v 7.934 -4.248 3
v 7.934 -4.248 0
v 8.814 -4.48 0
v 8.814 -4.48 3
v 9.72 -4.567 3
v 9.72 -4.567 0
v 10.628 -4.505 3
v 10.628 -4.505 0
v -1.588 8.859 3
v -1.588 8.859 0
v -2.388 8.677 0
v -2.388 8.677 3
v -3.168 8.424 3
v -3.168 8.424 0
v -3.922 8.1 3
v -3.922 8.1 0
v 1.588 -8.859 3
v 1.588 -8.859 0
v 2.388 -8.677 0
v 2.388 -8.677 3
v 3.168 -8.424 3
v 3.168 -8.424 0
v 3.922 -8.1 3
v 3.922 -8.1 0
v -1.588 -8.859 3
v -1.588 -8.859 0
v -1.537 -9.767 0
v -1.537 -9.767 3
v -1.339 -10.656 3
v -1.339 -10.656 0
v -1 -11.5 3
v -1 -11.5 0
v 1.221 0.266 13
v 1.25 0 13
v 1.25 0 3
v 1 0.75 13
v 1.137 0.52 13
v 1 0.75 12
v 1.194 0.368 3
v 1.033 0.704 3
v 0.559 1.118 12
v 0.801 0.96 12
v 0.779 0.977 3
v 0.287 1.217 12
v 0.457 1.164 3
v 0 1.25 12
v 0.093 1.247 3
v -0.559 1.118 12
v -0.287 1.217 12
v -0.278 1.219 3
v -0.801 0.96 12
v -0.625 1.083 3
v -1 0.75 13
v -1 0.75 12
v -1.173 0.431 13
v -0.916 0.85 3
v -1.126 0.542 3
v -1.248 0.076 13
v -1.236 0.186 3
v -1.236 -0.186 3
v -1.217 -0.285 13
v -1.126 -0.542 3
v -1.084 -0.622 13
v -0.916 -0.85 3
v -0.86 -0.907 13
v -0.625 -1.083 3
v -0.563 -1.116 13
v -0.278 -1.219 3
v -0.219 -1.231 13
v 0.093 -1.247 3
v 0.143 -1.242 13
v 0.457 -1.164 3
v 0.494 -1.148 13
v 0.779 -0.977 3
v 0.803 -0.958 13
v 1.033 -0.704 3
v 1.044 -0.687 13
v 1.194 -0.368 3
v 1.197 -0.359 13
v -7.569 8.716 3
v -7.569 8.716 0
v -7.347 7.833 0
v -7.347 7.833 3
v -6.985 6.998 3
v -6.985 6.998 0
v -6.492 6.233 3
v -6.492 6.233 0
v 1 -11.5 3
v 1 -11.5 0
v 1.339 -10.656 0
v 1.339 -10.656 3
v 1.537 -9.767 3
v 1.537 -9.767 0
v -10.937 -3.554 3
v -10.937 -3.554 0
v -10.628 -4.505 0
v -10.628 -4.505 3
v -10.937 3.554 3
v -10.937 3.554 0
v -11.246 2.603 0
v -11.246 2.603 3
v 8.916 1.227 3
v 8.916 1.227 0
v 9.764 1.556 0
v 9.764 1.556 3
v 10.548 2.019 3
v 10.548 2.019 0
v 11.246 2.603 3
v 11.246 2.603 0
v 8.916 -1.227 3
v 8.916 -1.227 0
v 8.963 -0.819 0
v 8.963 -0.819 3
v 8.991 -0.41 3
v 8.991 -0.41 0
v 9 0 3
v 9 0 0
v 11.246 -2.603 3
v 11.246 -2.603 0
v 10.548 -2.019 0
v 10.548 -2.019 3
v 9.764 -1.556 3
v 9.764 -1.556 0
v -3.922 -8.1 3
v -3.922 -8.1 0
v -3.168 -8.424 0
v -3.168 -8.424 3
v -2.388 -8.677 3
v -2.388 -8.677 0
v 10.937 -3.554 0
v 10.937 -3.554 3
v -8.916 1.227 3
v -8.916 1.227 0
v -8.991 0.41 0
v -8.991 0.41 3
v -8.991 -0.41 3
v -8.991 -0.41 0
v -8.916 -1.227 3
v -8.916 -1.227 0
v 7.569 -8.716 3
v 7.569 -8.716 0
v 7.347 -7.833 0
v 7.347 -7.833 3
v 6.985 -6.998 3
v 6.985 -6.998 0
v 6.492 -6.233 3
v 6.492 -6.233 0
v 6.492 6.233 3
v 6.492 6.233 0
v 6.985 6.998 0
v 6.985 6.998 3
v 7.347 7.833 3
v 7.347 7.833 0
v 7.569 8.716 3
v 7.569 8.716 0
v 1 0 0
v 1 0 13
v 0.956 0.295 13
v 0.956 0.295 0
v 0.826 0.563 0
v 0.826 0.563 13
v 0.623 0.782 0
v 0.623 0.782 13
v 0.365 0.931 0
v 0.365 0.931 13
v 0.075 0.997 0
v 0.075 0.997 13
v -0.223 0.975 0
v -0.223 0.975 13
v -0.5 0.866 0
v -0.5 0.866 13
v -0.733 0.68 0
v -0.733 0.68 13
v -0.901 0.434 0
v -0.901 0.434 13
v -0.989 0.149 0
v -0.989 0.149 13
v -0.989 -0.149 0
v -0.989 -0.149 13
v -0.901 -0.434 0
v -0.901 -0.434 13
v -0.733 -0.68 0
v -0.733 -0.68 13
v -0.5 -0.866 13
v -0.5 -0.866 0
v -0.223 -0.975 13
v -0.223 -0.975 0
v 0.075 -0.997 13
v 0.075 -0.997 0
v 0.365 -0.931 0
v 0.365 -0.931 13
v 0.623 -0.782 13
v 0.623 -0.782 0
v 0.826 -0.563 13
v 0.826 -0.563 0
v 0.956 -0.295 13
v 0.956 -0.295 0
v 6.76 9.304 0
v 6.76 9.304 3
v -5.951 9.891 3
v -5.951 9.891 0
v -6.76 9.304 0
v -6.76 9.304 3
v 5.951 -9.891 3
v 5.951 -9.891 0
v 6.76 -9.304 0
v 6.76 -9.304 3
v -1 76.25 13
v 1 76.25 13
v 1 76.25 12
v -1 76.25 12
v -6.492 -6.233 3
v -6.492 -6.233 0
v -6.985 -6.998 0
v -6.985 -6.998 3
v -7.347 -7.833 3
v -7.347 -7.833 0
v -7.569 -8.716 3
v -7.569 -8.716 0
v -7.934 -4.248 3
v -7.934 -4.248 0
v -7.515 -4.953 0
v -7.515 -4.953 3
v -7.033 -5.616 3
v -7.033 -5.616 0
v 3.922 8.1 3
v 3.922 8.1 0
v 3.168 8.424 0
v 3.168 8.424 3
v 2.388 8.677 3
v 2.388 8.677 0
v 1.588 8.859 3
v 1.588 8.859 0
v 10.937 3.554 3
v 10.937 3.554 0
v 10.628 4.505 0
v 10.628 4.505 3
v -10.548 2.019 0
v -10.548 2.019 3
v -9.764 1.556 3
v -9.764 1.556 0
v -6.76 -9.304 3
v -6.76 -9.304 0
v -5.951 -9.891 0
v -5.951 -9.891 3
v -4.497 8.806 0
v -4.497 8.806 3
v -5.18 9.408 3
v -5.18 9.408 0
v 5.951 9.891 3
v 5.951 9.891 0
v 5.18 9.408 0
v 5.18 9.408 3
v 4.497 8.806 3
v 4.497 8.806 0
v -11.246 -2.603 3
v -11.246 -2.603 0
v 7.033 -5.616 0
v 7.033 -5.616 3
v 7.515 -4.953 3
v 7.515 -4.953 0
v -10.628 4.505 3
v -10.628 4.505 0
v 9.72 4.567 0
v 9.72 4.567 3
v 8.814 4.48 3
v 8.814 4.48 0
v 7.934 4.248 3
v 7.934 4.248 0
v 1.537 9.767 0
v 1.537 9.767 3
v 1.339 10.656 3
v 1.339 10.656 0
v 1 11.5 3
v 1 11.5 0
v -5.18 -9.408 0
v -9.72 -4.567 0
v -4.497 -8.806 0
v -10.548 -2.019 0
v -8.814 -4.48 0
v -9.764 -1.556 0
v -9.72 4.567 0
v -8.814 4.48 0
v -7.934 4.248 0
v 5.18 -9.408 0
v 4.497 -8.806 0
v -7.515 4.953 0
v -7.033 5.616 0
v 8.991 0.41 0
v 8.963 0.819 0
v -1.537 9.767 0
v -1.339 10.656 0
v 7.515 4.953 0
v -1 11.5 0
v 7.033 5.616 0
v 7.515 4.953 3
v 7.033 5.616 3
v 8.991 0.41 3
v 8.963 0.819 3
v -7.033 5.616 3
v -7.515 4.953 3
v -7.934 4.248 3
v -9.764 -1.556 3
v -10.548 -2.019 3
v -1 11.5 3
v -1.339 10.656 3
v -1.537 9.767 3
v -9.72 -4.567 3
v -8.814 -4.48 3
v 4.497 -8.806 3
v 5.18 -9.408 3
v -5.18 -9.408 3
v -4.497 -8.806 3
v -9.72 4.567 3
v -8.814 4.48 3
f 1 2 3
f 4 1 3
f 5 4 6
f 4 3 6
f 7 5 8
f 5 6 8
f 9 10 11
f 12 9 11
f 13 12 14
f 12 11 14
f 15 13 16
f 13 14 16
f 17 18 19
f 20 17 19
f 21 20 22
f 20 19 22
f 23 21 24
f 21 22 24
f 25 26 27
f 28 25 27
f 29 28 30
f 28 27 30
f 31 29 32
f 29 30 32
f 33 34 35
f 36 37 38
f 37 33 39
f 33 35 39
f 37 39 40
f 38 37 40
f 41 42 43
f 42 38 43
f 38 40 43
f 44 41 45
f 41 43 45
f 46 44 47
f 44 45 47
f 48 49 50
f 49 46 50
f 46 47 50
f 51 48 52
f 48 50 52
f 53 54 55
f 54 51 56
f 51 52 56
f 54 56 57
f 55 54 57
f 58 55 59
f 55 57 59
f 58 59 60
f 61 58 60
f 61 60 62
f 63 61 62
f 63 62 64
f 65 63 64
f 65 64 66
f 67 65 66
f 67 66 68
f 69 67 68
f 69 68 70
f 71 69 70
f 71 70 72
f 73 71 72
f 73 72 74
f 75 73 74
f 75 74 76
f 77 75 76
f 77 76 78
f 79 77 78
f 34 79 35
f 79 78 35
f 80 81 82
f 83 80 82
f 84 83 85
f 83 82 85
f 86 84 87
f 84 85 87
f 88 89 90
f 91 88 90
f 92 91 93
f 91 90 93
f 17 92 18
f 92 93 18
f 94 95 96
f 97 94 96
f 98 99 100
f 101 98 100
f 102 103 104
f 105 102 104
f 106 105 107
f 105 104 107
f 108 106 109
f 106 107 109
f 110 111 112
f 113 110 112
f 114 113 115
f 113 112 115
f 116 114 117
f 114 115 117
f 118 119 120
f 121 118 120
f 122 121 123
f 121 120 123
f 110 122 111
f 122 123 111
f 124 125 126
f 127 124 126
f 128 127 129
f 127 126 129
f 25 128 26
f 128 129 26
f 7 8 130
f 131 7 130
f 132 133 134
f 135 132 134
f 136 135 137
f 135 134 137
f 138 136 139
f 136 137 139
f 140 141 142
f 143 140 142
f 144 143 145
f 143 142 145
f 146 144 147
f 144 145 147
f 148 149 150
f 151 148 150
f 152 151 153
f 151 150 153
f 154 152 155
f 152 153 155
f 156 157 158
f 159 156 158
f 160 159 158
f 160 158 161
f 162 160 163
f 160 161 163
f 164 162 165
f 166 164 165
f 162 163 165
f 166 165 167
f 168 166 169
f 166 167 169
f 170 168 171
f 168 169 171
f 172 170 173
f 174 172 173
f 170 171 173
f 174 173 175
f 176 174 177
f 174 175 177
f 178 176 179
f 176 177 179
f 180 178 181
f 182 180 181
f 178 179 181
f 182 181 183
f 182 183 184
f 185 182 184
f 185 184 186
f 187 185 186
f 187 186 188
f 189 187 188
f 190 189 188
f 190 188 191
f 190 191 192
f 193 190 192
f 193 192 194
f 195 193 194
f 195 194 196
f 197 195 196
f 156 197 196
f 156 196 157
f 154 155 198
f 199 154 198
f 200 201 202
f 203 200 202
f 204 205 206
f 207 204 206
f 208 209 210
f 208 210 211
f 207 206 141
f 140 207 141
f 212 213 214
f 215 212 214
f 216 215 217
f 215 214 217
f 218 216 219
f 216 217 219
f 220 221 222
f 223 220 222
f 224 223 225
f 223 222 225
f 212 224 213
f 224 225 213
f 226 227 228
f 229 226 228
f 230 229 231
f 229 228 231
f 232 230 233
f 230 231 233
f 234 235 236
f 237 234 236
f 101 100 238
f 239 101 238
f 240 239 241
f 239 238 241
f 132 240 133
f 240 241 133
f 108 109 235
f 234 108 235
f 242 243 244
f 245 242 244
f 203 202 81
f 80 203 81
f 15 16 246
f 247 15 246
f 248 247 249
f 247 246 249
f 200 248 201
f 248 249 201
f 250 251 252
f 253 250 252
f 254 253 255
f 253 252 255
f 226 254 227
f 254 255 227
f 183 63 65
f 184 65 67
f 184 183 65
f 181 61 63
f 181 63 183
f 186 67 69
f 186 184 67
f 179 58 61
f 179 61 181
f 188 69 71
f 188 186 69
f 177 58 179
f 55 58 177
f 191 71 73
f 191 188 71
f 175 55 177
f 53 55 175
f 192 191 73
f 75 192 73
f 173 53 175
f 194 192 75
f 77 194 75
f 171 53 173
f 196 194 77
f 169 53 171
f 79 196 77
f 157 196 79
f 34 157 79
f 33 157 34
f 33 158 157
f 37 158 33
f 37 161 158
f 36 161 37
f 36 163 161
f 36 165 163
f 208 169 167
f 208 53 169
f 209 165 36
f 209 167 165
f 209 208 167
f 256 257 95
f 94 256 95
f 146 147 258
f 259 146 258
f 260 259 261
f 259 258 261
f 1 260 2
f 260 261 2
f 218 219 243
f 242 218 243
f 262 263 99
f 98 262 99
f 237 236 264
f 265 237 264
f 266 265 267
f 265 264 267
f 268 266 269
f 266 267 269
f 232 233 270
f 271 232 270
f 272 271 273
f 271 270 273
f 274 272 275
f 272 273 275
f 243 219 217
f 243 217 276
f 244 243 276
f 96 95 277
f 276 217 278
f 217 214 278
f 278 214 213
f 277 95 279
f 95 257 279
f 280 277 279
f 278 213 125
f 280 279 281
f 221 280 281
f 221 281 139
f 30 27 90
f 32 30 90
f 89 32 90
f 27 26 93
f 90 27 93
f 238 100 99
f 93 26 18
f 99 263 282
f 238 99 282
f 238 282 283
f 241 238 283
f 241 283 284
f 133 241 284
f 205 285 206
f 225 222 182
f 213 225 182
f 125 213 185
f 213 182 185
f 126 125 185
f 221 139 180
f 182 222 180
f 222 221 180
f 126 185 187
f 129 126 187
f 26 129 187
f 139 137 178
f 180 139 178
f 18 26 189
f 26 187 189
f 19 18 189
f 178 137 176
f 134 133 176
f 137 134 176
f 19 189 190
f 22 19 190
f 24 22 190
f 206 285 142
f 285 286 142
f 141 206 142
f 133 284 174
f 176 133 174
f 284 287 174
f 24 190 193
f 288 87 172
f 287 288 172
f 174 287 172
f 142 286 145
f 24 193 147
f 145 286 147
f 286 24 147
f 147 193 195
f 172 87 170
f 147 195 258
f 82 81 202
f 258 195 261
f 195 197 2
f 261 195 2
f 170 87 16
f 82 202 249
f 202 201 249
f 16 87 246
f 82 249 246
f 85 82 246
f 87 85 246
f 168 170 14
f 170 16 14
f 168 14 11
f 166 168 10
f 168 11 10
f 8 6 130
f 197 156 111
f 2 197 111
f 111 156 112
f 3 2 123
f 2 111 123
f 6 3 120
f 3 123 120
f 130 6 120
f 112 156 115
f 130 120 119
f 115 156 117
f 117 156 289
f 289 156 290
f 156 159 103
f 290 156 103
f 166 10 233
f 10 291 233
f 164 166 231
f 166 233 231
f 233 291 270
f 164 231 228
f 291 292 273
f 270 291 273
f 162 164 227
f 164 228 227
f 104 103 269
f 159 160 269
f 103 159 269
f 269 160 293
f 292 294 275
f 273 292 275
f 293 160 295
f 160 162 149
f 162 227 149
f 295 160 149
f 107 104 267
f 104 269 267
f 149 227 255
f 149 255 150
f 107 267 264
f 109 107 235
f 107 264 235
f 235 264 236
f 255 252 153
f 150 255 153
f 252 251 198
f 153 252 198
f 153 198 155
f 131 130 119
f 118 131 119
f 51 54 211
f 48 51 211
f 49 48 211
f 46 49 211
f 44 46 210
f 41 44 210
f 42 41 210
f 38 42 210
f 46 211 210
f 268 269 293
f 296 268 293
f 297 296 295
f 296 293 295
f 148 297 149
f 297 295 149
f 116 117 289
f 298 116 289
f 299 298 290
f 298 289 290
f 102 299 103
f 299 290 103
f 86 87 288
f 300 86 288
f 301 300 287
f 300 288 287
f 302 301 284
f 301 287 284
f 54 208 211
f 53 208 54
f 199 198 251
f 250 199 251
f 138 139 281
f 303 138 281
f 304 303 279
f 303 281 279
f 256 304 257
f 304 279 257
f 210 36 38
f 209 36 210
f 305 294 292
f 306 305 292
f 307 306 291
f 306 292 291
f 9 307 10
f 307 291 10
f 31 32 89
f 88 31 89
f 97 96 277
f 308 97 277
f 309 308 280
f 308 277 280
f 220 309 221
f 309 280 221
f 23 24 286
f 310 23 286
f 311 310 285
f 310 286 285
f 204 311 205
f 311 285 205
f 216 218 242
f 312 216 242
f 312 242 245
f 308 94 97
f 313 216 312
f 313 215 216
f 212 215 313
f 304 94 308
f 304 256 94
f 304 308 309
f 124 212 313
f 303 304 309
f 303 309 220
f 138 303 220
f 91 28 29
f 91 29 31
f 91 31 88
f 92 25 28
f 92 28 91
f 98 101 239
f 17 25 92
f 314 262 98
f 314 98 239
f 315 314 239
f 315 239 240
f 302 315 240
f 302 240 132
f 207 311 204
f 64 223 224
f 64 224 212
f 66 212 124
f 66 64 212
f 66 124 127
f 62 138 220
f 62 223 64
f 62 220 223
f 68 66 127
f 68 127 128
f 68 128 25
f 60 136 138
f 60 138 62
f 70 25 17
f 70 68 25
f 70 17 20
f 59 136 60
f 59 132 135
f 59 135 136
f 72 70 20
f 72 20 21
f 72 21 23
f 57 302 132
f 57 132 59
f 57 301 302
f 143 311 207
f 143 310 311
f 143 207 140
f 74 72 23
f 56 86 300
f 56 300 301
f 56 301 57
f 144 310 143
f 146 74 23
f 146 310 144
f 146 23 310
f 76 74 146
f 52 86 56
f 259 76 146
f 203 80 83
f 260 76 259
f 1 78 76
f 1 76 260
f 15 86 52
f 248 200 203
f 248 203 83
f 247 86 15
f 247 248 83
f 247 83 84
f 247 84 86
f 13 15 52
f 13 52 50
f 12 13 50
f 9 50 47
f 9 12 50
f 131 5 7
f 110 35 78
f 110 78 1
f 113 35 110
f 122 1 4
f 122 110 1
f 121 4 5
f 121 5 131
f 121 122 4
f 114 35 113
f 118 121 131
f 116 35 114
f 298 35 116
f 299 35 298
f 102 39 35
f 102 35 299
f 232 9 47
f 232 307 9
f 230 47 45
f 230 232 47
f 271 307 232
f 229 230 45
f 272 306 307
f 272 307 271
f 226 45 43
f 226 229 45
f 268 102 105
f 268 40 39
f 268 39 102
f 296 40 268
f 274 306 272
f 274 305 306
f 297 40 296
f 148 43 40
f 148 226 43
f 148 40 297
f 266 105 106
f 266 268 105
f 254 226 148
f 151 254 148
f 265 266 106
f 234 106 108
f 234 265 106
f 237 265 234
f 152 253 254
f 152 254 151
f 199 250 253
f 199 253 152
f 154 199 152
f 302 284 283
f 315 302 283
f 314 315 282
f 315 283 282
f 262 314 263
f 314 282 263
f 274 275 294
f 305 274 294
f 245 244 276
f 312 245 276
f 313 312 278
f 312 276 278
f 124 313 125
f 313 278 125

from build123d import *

# Parameters (mm, degrees)
F1_DEPTH = 3
F2_R     = 1.25
F3_DEPTH = 10
F4_R     = 1
F5_DEPTH = 25
F6_W     = 1
F6_H     = 75
F7_DEPTH = 1


with BuildPart() as f1:
    # F0 (on Top) → F1 (new body)
    with BuildSketch(Plane.XY):
        with BuildLine():
            ThreePointArc((8.915987, -1.226854), (8.978972, -0.614863), (9, 0))
            ThreePointArc((9, 0), (8.978972, 0.614863), (8.915987, 1.226854))
            ThreePointArc((8.915987, 1.226854), (8.559509, 2.781153), (7.934312, 4.24814))
            ThreePointArc((7.934312, 4.24814), (7.281153, 5.290067), (6.492059, 6.233231))
            ThreePointArc((6.492059, 6.233231), (5.290067, 7.281153), (3.921999, 8.100489))
            ThreePointArc((3.921999, 8.100489), (2.781153, 8.559509), (1.588385, 8.858726))
            ThreePointArc((1.588385, 8.858726), (0, 9), (-1.588385, 8.858726))
            ThreePointArc((-1.588385, 8.858726), (-2.781153, 8.559509), (-3.921999, 8.100489))
            ThreePointArc((-3.921999, 8.100489), (-5.290067, 7.281153), (-6.492059, 6.233231))
            ThreePointArc((-6.492059, 6.233231), (-7.281153, 5.290067), (-7.934312, 4.24814))
            ThreePointArc((-7.934312, 4.24814), (-8.559509, 2.781153), (-8.915987, 1.226854))
            ThreePointArc((-8.915987, 1.226854), (-9, 0), (-8.915987, -1.226854))
            ThreePointArc((-8.915987, -1.226854), (-8.559509, -2.781153), (-7.934312, -4.24814))
            ThreePointArc((-7.934312, -4.24814), (-7.281153, -5.290067), (-6.492059, -6.233231))
            ThreePointArc((-6.492059, -6.233231), (-5.290067, -7.281153), (-3.921999, -8.100489))
            ThreePointArc((-3.921999, -8.100489), (-2.781153, -8.559509), (-1.588385, -8.858726))
            ThreePointArc((-1.588385, -8.858726), (0, -9), (1.588385, -8.858726))
            ThreePointArc((1.588385, -8.858726), (2.781153, -8.559509), (3.921999, -8.100489))
            ThreePointArc((3.921999, -8.100489), (5.290067, -7.281153), (6.492059, -6.233231))
            ThreePointArc((6.492059, -6.233231), (7.281153, -5.290067), (7.934312, -4.24814))
            ThreePointArc((7.934312, -4.24814), (8.559509, -2.781153), (8.915987, -1.226854))
        make_face()
        with BuildLine():
            ThreePointArc((7.934312, 4.24814), (8.559509, 2.781153), (8.915987, 1.226854))
            ThreePointArc((8.915987, 1.226854), (10.16558, 1.771623), (11.246167, 2.602639))
            Line((11.246167, 2.602639), (10.93715, 3.553695))
            Line((10.93715, 3.553695), (10.628133, 4.504752))
            ThreePointArc((10.628133, 4.504752), (9.265461, 4.541905), (7.934312, 4.24814))
        make_face()
        with BuildLine():
            ThreePointArc((11.246167, -2.602639), (10.16558, -1.771623), (8.915987, -1.226854))
            ThreePointArc((8.915987, -1.226854), (8.559509, -2.781153), (7.934312, -4.24814))
            ThreePointArc((7.934312, -4.24814), (9.265461, -4.541905), (10.628133, -4.504752))
            Line((10.628133, -4.504752), (10.93715, -3.553695))
            Line((10.93715, -3.553695), (11.246167, -2.602639))
        make_face()
        with BuildLine():
            ThreePointArc((3.921999, 8.100489), (5.290067, 7.281153), (6.492059, 6.233231))
            ThreePointArc((6.492059, 6.233231), (7.182793, 7.408451), (7.568547, 8.71591))
            Line((7.568547, 8.71591), (6.75953, 9.303695))
            Line((6.75953, 9.303695), (5.950513, 9.891481))
            ThreePointArc((5.950513, 9.891481), (4.826251, 9.120579), (3.921999, 8.100489))
        make_face()
        with BuildLine():
            ThreePointArc((7.568547, -8.71591), (7.182793, -7.408451), (6.492059, -6.233231))
            ThreePointArc((6.492059, -6.233231), (5.290067, -7.281153), (3.921999, -8.100489))
            ThreePointArc((3.921999, -8.100489), (4.826251, -9.120579), (5.950513, -9.891481))
            Line((5.950513, -9.891481), (6.75953, -9.303695))
            Line((6.75953, -9.303695), (7.568547, -8.71591))
        make_face()
        with BuildLine():
            ThreePointArc((-1.588385, 8.858726), (0, 9), (1.588385, 8.858726))
            ThreePointArc((1.588385, 8.858726), (1.456423, 10.215503), (1, 11.5))
            Line((1, 11.5), (0, 11.5))
            Line((0, 11.5), (-1, 11.5))
            ThreePointArc((-1, 11.5), (-1.456423, 10.215503), (-1.588385, 8.858726))
        make_face()
        with BuildLine():
            ThreePointArc((1, -11.5), (1.456423, -10.215503), (1.588385, -8.858726))
            ThreePointArc((1.588385, -8.858726), (0, -9), (-1.588385, -8.858726))
            ThreePointArc((-1.588385, -8.858726), (-1.456423, -10.215503), (-1, -11.5))
            Line((-1, -11.5), (0, -11.5))
            Line((0, -11.5), (1, -11.5))
        make_face()
        with BuildLine():
            ThreePointArc((-6.492059, 6.233231), (-5.290067, 7.281153), (-3.921999, 8.100489))
            ThreePointArc((-3.921999, 8.100489), (-4.826251, 9.120579), (-5.950513, 9.891481))
            Line((-5.950513, 9.891481), (-6.75953, 9.303695))
            Line((-6.75953, 9.303695), (-7.568547, 8.71591))
            ThreePointArc((-7.568547, 8.71591), (-7.182793, 7.408451), (-6.492059, 6.233231))
        make_face()
        with BuildLine():
            ThreePointArc((-5.950513, -9.891481), (-4.826251, -9.120579), (-3.921999, -8.100489))
            ThreePointArc((-3.921999, -8.100489), (-5.290067, -7.281153), (-6.492059, -6.233231))
            ThreePointArc((-6.492059, -6.233231), (-7.182793, -7.408451), (-7.568547, -8.71591))
            Line((-7.568547, -8.71591), (-6.75953, -9.303695))
            Line((-6.75953, -9.303695), (-5.950513, -9.891481))
        make_face()
        with BuildLine():
            ThreePointArc((-8.915987, 1.226854), (-8.559509, 2.781153), (-7.934312, 4.24814))
            ThreePointArc((-7.934312, 4.24814), (-9.265461, 4.541905), (-10.628133, 4.504752))
            Line((-10.628133, 4.504752), (-10.93715, 3.553695))
            Line((-10.93715, 3.553695), (-11.246167, 2.602639))
            ThreePointArc((-11.246167, 2.602639), (-10.16558, 1.771623), (-8.915987, 1.226854))
        make_face()
        with BuildLine():
            ThreePointArc((-10.628133, -4.504752), (-9.265461, -4.541905), (-7.934312, -4.24814))
            ThreePointArc((-7.934312, -4.24814), (-8.559509, -2.781153), (-8.915987, -1.226854))
            ThreePointArc((-8.915987, -1.226854), (-10.16558, -1.771623), (-11.246167, -2.602639))
            Line((-11.246167, -2.602639), (-10.93715, -3.553695))
            Line((-10.93715, -3.553695), (-10.628133, -4.504752))
        make_face()
    extrude(amount=F1_DEPTH)

    # F2 (on face) → F3 (join)
    with BuildSketch(Plane.XY.offset(3)):
        Circle(F2_R)
    extrude(amount=F3_DEPTH)

    # F4 (on face) → F5 (cut)
    with BuildSketch(Plane.XY.offset(13)):
        Circle(F4_R)
    extrude(amount=-F5_DEPTH, mode=Mode.SUBTRACT)

    # F6 (on face) → F7 (join)
    with BuildSketch(Plane.XY.offset(13)):
        with BuildLine():
            ThreePointArc((-1, 0.75), (-0.559017, 1.118034), (0, 1.25))
            Line((0, 1.25), (-1, 1.25))
            Line((-1, 1.25), (-1, 0.75))
        make_face()
        with Locations((-0.5, 38.75)):
            Rectangle(F6_W, F6_H)
        with Locations((0.5, 38.75)):
            Rectangle(F6_W, F6_H)
        with BuildLine():
            Line((1, 1.25), (0, 1.25))
            ThreePointArc((0, 1.25), (0.559017, 1.118034), (1, 0.75))
            Line((1, 0.75), (1, 1.25))
        make_face()
    extrude(amount=-F7_DEPTH)


solid = f1.part
